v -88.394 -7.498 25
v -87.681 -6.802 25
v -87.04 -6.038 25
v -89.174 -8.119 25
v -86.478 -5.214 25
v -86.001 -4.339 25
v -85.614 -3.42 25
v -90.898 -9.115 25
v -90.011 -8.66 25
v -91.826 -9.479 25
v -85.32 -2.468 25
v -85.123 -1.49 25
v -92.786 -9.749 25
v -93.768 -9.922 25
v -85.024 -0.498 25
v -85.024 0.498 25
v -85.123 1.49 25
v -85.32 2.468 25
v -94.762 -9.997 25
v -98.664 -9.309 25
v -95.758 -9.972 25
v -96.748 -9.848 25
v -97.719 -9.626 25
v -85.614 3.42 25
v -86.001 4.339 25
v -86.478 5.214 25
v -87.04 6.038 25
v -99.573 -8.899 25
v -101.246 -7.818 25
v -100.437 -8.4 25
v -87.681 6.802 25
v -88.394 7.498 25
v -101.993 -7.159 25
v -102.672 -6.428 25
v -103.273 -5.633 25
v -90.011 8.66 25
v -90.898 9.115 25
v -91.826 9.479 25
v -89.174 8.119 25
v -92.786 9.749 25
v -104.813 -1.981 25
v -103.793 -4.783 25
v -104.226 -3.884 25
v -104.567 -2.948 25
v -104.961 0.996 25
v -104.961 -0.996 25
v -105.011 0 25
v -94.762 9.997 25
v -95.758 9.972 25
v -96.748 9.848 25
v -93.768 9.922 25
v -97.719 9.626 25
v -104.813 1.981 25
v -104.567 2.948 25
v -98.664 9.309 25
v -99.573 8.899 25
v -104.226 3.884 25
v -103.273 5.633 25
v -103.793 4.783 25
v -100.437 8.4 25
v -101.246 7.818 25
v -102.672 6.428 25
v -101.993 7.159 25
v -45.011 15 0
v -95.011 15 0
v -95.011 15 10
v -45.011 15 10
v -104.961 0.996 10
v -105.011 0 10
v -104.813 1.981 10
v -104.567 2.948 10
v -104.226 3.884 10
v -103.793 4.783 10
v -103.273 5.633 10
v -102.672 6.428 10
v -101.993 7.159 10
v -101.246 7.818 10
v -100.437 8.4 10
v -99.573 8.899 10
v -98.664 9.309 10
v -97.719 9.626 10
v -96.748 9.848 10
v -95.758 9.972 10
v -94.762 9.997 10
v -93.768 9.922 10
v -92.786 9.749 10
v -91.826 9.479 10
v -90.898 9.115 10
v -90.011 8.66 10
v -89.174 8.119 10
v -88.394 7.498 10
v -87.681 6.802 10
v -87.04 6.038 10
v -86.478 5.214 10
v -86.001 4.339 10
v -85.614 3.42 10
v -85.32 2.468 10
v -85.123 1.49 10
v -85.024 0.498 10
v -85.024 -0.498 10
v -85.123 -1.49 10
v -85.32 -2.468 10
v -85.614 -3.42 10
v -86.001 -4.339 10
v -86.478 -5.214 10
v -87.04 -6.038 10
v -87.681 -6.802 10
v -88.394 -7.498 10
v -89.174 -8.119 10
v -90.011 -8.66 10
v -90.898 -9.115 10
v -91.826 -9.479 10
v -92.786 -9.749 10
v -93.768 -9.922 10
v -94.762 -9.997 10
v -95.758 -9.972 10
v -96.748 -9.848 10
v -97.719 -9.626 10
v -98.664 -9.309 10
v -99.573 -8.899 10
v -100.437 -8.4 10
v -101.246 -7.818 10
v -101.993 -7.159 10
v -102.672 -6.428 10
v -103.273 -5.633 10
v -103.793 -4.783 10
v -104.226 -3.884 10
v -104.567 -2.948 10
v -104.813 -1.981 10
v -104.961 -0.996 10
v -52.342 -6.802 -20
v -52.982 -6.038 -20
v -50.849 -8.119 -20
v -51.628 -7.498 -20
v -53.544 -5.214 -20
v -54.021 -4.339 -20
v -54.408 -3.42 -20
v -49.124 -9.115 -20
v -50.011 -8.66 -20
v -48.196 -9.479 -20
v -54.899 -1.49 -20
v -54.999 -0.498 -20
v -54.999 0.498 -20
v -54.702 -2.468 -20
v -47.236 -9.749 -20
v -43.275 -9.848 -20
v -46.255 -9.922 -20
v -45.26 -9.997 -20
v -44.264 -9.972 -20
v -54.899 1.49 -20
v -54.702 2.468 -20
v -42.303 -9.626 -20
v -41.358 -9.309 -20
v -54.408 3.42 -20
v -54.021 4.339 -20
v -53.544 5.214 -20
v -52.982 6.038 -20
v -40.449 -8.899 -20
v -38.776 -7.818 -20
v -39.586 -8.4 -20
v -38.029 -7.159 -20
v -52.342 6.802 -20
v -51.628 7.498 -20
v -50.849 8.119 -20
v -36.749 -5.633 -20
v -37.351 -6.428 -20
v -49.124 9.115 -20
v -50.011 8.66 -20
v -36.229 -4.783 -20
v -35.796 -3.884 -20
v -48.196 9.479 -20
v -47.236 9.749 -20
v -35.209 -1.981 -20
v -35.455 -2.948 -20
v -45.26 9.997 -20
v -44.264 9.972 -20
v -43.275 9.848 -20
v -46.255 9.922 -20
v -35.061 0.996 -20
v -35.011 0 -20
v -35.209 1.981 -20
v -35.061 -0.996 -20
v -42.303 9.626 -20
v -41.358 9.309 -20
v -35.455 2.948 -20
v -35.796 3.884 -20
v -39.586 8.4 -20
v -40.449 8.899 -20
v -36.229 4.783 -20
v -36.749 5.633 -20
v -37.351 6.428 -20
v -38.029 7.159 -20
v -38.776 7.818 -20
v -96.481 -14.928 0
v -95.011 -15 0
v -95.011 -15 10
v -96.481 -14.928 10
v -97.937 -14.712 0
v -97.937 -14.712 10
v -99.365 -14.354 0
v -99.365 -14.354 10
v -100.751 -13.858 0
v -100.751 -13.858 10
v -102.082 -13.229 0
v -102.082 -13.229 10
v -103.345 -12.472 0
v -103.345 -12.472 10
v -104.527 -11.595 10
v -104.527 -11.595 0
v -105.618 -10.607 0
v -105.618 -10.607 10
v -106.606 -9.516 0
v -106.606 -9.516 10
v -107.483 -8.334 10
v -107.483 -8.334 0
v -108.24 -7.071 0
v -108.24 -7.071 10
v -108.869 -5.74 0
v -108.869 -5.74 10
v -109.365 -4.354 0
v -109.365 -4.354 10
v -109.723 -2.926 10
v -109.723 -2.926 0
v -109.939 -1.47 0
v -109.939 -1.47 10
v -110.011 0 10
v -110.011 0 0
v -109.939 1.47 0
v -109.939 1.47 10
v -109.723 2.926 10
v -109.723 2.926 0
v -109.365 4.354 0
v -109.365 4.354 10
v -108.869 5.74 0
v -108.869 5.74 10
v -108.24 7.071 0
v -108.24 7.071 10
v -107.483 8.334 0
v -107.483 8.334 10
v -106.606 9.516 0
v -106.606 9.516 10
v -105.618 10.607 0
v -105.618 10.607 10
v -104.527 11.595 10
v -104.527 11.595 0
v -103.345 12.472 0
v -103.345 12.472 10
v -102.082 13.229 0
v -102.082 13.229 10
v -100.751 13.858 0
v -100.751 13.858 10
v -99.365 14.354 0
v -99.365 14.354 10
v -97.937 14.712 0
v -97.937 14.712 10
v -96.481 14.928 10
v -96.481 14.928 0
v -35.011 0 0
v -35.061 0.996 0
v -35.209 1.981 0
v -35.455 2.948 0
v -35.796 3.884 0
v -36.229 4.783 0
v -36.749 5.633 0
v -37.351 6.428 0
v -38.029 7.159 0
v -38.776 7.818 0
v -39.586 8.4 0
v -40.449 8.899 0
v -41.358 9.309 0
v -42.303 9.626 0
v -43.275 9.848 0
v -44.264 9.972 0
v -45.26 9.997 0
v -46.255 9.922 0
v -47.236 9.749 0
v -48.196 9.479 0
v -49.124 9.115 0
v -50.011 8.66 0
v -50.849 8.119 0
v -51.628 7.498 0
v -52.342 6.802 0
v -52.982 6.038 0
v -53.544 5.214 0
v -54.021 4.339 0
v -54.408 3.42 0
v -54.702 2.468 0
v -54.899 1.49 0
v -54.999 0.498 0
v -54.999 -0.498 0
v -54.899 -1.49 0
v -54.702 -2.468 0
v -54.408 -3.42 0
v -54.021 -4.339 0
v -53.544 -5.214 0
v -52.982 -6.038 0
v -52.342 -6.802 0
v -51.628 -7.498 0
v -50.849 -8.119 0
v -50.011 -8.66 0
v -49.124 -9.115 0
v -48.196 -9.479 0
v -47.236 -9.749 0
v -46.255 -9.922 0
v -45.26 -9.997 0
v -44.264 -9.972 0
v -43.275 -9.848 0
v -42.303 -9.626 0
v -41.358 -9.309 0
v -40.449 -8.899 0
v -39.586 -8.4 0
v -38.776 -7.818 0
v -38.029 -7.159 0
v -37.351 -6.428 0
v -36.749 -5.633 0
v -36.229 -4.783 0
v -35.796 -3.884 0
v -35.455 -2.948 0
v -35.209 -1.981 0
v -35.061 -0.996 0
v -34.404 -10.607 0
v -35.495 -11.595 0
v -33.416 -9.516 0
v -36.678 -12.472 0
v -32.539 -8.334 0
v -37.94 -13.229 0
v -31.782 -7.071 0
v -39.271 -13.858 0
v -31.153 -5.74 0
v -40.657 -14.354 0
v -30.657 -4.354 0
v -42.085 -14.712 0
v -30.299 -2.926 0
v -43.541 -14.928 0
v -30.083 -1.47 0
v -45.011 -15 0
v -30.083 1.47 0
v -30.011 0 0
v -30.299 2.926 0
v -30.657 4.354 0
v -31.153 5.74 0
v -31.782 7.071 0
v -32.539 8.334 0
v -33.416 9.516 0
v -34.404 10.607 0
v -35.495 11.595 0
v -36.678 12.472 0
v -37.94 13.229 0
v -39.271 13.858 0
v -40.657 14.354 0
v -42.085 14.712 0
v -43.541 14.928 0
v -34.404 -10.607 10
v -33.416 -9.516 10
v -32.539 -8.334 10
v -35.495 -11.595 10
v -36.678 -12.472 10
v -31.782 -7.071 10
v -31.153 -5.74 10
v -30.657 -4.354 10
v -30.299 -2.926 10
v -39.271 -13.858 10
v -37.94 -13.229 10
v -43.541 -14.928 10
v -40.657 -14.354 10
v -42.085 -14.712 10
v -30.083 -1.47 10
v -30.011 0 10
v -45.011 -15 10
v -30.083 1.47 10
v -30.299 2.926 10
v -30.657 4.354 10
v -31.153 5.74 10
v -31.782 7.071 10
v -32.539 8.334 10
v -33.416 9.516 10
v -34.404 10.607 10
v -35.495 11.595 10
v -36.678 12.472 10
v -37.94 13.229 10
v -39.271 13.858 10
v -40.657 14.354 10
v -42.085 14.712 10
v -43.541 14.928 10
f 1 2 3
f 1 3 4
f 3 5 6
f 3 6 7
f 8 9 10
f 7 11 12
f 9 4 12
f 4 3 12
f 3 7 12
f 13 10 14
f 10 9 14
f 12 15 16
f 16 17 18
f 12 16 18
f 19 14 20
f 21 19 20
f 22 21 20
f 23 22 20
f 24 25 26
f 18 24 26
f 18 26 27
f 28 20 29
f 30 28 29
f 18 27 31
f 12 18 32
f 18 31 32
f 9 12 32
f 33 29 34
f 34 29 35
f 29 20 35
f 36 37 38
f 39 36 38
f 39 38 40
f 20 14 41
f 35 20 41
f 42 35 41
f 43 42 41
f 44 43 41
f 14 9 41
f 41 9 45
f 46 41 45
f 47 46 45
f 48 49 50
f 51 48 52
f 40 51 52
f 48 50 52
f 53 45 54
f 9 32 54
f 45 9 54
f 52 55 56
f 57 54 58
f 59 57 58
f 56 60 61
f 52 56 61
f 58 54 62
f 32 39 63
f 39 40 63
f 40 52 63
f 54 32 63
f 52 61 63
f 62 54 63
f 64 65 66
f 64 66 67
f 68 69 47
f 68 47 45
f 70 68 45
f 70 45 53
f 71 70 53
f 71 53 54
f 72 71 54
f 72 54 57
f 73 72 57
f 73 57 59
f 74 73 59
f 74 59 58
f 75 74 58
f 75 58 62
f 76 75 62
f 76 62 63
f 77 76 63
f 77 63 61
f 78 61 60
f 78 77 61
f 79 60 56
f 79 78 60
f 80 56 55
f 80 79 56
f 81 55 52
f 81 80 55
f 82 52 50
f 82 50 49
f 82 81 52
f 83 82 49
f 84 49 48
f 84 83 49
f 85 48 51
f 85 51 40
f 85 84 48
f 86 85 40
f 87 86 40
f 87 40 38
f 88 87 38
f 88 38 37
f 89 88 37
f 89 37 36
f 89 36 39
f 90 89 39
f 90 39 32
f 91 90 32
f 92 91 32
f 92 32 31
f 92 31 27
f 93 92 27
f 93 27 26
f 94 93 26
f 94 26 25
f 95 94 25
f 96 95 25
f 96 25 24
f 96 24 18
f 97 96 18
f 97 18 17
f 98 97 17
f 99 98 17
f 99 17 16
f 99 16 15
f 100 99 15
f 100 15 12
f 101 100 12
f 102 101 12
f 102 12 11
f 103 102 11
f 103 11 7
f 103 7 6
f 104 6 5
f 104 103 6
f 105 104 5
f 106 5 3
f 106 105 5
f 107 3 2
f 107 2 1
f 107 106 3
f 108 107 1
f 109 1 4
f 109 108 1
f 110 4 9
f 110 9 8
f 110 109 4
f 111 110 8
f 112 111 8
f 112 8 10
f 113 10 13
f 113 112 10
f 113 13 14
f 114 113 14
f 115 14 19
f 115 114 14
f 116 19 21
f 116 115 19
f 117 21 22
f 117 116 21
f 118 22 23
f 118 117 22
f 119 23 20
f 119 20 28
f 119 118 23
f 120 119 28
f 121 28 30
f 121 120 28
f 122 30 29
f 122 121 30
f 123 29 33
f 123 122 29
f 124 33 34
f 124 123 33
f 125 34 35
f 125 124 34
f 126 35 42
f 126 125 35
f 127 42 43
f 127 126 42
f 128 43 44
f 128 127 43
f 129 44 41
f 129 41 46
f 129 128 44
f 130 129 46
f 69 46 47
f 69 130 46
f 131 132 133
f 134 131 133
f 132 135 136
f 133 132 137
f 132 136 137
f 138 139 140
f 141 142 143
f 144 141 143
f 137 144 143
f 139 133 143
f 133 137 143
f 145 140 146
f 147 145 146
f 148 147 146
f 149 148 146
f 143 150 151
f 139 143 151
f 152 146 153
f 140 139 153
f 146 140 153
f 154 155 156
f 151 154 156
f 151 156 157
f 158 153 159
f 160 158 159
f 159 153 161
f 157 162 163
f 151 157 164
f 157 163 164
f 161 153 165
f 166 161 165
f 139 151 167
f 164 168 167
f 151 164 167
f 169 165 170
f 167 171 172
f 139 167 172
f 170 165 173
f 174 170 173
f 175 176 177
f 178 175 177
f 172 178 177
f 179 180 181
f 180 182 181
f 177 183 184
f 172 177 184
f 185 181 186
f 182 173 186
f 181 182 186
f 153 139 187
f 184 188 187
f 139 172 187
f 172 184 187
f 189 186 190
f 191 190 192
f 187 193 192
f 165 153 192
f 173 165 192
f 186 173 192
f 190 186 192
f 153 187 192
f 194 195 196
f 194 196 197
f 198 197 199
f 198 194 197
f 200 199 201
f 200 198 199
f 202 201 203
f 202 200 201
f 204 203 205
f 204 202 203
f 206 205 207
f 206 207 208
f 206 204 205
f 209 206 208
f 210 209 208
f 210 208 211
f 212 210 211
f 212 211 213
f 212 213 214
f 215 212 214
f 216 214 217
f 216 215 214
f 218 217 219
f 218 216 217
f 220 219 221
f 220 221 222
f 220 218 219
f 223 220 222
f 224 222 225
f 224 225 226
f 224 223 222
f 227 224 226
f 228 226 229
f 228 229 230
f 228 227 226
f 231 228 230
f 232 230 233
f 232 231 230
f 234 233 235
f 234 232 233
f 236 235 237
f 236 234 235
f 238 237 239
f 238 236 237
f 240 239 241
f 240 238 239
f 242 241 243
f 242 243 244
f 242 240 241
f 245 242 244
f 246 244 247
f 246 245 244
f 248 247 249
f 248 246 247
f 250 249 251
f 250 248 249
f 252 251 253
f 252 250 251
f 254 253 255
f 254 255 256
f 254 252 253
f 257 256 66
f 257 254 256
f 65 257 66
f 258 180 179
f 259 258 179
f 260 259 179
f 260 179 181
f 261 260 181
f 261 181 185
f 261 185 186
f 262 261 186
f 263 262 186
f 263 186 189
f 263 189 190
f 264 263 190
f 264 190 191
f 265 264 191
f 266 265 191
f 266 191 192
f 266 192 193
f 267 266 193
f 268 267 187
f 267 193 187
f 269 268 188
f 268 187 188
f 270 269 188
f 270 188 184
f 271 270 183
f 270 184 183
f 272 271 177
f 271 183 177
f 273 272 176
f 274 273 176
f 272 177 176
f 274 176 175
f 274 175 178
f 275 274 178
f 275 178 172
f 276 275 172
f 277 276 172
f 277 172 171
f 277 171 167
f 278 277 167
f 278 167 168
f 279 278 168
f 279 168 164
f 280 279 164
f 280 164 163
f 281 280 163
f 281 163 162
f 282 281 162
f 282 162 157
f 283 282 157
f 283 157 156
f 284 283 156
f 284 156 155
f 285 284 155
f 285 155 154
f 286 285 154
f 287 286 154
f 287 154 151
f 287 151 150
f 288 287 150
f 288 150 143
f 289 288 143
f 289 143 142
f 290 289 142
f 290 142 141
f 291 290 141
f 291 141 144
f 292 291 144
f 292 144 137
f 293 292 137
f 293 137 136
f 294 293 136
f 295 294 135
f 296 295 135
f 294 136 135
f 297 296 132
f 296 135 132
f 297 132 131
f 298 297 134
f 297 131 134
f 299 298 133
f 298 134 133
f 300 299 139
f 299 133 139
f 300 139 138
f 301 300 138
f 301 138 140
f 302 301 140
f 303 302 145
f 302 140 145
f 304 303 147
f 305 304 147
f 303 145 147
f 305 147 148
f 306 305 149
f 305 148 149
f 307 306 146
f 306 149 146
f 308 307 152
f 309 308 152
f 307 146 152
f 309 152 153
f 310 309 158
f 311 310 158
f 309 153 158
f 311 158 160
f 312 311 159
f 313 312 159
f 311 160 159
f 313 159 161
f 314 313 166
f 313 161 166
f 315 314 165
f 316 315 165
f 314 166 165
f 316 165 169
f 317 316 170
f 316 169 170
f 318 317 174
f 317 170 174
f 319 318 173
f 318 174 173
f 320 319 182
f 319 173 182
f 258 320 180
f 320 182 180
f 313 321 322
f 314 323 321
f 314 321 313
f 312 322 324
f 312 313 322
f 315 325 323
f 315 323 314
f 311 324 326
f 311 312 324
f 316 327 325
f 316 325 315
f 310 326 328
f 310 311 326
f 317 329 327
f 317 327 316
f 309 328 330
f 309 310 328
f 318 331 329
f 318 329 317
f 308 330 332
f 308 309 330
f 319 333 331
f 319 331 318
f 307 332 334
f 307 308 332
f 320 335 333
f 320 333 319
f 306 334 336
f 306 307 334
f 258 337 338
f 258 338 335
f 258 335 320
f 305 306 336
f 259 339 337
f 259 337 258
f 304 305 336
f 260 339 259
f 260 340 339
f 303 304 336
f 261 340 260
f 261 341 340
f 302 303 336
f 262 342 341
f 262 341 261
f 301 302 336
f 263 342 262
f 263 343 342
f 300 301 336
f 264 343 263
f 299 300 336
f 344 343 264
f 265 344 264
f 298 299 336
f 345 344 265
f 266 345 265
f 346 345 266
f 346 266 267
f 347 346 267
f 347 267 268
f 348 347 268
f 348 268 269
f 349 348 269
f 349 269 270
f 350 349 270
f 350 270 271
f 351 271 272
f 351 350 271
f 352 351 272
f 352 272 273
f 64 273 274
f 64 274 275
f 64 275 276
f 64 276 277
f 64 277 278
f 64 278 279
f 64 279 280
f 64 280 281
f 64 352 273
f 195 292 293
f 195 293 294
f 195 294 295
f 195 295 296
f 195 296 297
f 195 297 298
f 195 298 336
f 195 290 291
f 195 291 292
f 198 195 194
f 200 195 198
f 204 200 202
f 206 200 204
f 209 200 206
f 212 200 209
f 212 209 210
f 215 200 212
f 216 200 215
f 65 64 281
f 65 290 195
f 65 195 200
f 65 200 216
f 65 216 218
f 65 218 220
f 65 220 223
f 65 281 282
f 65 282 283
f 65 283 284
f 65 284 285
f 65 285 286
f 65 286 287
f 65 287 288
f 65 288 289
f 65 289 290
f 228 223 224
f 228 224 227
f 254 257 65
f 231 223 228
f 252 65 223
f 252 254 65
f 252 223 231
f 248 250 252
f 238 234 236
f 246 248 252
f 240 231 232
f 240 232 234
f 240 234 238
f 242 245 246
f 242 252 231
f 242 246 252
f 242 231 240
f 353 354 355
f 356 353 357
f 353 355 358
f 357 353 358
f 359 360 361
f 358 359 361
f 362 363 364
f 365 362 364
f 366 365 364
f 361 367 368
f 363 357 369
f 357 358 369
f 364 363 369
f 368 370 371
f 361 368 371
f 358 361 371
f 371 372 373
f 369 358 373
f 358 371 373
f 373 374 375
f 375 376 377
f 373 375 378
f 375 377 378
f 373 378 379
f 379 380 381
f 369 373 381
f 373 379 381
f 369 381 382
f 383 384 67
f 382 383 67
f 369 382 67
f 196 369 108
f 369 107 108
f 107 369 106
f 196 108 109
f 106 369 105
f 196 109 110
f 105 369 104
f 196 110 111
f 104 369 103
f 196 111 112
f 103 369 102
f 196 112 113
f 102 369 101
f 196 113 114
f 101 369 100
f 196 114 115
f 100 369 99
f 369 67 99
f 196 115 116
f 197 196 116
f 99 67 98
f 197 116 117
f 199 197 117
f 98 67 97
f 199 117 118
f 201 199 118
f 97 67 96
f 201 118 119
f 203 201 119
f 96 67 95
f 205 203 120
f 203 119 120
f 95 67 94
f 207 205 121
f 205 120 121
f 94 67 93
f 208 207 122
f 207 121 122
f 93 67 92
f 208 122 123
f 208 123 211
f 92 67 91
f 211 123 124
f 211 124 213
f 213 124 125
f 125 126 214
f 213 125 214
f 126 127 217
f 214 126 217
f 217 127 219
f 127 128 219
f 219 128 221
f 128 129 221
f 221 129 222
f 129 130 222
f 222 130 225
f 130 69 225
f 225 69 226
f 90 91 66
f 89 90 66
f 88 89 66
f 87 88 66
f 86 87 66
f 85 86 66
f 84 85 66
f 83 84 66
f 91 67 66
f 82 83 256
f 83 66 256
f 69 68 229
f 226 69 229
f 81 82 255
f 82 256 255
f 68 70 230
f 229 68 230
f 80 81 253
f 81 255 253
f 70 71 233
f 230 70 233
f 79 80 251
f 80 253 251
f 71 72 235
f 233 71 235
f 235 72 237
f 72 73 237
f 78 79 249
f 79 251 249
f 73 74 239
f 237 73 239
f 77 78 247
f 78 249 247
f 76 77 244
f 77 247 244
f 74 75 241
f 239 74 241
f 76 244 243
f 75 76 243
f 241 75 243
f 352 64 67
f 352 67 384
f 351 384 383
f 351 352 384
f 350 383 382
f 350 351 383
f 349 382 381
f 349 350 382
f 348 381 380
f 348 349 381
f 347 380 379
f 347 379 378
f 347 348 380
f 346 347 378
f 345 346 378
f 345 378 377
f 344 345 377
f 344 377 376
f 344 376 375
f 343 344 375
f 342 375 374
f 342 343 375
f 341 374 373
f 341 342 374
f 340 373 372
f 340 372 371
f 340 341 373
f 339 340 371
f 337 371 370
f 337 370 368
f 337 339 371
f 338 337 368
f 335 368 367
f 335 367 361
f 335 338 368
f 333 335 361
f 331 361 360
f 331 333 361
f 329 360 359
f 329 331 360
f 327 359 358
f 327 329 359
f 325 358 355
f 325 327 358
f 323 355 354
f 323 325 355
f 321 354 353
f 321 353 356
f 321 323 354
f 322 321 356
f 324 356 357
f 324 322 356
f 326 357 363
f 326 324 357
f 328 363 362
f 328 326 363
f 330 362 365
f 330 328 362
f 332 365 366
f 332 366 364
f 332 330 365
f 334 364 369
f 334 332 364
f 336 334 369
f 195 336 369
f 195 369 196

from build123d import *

# Parameters (mm, degrees)
SKETCH1_R           = 10
BOSS_EXTRUDE1_DEPTH = 10
BOSS_EXTRUDE2_START = -30
SKETCH2_R           = 10
BOSS_EXTRUDE2_DEPTH = 30
SKETCH3_R           = 10
BOSS_EXTRUDE3_DEPTH = 25


with BuildPart() as part:
    # Sketch1 → Boss-Extrude1 (new body)
    with BuildSketch(Plane.XY):
        with BuildLine():
            Line((-95.01107872, 15), (-45.01107872, 15))
            ThreePointArc((-45.01107872, 15), (-30.01107872, 0), (-45.01107872, -15))
            Line((-45.01107872, -15), (-95.01107872, -15))
            ThreePointArc((-95.01107872, -15), (-110.01107872, 0), (-95.01107872, 15))
        make_face()
        with Locations((-95.01107872, 0)):
            Circle(SKETCH1_R, mode=Mode.SUBTRACT)
        with Locations((-45.01107872, 0)):
            Circle(SKETCH1_R, mode=Mode.SUBTRACT)
    extrude(amount=BOSS_EXTRUDE1_DEPTH)

    # Sketch2 → Boss-Extrude2 (add)
    with BuildSketch(Plane.XY.offset(10).offset(BOSS_EXTRUDE2_START)):
        with Locations((-45.01107872, 0)):
            Circle(SKETCH2_R)
    extrude(amount=BOSS_EXTRUDE2_DEPTH)

    # Sketch3 → Boss-Extrude3 (add)
    with BuildSketch(Plane(origin=(0, 0, 0), x_dir=(-1, 0, 0), z_dir=(0, 0, -1))):
        with Locations((95.01107872, 0)):
            Circle(SKETCH3_R)
    extrude(amount=-BOSS_EXTRUDE3_DEPTH)


solid = part.part
